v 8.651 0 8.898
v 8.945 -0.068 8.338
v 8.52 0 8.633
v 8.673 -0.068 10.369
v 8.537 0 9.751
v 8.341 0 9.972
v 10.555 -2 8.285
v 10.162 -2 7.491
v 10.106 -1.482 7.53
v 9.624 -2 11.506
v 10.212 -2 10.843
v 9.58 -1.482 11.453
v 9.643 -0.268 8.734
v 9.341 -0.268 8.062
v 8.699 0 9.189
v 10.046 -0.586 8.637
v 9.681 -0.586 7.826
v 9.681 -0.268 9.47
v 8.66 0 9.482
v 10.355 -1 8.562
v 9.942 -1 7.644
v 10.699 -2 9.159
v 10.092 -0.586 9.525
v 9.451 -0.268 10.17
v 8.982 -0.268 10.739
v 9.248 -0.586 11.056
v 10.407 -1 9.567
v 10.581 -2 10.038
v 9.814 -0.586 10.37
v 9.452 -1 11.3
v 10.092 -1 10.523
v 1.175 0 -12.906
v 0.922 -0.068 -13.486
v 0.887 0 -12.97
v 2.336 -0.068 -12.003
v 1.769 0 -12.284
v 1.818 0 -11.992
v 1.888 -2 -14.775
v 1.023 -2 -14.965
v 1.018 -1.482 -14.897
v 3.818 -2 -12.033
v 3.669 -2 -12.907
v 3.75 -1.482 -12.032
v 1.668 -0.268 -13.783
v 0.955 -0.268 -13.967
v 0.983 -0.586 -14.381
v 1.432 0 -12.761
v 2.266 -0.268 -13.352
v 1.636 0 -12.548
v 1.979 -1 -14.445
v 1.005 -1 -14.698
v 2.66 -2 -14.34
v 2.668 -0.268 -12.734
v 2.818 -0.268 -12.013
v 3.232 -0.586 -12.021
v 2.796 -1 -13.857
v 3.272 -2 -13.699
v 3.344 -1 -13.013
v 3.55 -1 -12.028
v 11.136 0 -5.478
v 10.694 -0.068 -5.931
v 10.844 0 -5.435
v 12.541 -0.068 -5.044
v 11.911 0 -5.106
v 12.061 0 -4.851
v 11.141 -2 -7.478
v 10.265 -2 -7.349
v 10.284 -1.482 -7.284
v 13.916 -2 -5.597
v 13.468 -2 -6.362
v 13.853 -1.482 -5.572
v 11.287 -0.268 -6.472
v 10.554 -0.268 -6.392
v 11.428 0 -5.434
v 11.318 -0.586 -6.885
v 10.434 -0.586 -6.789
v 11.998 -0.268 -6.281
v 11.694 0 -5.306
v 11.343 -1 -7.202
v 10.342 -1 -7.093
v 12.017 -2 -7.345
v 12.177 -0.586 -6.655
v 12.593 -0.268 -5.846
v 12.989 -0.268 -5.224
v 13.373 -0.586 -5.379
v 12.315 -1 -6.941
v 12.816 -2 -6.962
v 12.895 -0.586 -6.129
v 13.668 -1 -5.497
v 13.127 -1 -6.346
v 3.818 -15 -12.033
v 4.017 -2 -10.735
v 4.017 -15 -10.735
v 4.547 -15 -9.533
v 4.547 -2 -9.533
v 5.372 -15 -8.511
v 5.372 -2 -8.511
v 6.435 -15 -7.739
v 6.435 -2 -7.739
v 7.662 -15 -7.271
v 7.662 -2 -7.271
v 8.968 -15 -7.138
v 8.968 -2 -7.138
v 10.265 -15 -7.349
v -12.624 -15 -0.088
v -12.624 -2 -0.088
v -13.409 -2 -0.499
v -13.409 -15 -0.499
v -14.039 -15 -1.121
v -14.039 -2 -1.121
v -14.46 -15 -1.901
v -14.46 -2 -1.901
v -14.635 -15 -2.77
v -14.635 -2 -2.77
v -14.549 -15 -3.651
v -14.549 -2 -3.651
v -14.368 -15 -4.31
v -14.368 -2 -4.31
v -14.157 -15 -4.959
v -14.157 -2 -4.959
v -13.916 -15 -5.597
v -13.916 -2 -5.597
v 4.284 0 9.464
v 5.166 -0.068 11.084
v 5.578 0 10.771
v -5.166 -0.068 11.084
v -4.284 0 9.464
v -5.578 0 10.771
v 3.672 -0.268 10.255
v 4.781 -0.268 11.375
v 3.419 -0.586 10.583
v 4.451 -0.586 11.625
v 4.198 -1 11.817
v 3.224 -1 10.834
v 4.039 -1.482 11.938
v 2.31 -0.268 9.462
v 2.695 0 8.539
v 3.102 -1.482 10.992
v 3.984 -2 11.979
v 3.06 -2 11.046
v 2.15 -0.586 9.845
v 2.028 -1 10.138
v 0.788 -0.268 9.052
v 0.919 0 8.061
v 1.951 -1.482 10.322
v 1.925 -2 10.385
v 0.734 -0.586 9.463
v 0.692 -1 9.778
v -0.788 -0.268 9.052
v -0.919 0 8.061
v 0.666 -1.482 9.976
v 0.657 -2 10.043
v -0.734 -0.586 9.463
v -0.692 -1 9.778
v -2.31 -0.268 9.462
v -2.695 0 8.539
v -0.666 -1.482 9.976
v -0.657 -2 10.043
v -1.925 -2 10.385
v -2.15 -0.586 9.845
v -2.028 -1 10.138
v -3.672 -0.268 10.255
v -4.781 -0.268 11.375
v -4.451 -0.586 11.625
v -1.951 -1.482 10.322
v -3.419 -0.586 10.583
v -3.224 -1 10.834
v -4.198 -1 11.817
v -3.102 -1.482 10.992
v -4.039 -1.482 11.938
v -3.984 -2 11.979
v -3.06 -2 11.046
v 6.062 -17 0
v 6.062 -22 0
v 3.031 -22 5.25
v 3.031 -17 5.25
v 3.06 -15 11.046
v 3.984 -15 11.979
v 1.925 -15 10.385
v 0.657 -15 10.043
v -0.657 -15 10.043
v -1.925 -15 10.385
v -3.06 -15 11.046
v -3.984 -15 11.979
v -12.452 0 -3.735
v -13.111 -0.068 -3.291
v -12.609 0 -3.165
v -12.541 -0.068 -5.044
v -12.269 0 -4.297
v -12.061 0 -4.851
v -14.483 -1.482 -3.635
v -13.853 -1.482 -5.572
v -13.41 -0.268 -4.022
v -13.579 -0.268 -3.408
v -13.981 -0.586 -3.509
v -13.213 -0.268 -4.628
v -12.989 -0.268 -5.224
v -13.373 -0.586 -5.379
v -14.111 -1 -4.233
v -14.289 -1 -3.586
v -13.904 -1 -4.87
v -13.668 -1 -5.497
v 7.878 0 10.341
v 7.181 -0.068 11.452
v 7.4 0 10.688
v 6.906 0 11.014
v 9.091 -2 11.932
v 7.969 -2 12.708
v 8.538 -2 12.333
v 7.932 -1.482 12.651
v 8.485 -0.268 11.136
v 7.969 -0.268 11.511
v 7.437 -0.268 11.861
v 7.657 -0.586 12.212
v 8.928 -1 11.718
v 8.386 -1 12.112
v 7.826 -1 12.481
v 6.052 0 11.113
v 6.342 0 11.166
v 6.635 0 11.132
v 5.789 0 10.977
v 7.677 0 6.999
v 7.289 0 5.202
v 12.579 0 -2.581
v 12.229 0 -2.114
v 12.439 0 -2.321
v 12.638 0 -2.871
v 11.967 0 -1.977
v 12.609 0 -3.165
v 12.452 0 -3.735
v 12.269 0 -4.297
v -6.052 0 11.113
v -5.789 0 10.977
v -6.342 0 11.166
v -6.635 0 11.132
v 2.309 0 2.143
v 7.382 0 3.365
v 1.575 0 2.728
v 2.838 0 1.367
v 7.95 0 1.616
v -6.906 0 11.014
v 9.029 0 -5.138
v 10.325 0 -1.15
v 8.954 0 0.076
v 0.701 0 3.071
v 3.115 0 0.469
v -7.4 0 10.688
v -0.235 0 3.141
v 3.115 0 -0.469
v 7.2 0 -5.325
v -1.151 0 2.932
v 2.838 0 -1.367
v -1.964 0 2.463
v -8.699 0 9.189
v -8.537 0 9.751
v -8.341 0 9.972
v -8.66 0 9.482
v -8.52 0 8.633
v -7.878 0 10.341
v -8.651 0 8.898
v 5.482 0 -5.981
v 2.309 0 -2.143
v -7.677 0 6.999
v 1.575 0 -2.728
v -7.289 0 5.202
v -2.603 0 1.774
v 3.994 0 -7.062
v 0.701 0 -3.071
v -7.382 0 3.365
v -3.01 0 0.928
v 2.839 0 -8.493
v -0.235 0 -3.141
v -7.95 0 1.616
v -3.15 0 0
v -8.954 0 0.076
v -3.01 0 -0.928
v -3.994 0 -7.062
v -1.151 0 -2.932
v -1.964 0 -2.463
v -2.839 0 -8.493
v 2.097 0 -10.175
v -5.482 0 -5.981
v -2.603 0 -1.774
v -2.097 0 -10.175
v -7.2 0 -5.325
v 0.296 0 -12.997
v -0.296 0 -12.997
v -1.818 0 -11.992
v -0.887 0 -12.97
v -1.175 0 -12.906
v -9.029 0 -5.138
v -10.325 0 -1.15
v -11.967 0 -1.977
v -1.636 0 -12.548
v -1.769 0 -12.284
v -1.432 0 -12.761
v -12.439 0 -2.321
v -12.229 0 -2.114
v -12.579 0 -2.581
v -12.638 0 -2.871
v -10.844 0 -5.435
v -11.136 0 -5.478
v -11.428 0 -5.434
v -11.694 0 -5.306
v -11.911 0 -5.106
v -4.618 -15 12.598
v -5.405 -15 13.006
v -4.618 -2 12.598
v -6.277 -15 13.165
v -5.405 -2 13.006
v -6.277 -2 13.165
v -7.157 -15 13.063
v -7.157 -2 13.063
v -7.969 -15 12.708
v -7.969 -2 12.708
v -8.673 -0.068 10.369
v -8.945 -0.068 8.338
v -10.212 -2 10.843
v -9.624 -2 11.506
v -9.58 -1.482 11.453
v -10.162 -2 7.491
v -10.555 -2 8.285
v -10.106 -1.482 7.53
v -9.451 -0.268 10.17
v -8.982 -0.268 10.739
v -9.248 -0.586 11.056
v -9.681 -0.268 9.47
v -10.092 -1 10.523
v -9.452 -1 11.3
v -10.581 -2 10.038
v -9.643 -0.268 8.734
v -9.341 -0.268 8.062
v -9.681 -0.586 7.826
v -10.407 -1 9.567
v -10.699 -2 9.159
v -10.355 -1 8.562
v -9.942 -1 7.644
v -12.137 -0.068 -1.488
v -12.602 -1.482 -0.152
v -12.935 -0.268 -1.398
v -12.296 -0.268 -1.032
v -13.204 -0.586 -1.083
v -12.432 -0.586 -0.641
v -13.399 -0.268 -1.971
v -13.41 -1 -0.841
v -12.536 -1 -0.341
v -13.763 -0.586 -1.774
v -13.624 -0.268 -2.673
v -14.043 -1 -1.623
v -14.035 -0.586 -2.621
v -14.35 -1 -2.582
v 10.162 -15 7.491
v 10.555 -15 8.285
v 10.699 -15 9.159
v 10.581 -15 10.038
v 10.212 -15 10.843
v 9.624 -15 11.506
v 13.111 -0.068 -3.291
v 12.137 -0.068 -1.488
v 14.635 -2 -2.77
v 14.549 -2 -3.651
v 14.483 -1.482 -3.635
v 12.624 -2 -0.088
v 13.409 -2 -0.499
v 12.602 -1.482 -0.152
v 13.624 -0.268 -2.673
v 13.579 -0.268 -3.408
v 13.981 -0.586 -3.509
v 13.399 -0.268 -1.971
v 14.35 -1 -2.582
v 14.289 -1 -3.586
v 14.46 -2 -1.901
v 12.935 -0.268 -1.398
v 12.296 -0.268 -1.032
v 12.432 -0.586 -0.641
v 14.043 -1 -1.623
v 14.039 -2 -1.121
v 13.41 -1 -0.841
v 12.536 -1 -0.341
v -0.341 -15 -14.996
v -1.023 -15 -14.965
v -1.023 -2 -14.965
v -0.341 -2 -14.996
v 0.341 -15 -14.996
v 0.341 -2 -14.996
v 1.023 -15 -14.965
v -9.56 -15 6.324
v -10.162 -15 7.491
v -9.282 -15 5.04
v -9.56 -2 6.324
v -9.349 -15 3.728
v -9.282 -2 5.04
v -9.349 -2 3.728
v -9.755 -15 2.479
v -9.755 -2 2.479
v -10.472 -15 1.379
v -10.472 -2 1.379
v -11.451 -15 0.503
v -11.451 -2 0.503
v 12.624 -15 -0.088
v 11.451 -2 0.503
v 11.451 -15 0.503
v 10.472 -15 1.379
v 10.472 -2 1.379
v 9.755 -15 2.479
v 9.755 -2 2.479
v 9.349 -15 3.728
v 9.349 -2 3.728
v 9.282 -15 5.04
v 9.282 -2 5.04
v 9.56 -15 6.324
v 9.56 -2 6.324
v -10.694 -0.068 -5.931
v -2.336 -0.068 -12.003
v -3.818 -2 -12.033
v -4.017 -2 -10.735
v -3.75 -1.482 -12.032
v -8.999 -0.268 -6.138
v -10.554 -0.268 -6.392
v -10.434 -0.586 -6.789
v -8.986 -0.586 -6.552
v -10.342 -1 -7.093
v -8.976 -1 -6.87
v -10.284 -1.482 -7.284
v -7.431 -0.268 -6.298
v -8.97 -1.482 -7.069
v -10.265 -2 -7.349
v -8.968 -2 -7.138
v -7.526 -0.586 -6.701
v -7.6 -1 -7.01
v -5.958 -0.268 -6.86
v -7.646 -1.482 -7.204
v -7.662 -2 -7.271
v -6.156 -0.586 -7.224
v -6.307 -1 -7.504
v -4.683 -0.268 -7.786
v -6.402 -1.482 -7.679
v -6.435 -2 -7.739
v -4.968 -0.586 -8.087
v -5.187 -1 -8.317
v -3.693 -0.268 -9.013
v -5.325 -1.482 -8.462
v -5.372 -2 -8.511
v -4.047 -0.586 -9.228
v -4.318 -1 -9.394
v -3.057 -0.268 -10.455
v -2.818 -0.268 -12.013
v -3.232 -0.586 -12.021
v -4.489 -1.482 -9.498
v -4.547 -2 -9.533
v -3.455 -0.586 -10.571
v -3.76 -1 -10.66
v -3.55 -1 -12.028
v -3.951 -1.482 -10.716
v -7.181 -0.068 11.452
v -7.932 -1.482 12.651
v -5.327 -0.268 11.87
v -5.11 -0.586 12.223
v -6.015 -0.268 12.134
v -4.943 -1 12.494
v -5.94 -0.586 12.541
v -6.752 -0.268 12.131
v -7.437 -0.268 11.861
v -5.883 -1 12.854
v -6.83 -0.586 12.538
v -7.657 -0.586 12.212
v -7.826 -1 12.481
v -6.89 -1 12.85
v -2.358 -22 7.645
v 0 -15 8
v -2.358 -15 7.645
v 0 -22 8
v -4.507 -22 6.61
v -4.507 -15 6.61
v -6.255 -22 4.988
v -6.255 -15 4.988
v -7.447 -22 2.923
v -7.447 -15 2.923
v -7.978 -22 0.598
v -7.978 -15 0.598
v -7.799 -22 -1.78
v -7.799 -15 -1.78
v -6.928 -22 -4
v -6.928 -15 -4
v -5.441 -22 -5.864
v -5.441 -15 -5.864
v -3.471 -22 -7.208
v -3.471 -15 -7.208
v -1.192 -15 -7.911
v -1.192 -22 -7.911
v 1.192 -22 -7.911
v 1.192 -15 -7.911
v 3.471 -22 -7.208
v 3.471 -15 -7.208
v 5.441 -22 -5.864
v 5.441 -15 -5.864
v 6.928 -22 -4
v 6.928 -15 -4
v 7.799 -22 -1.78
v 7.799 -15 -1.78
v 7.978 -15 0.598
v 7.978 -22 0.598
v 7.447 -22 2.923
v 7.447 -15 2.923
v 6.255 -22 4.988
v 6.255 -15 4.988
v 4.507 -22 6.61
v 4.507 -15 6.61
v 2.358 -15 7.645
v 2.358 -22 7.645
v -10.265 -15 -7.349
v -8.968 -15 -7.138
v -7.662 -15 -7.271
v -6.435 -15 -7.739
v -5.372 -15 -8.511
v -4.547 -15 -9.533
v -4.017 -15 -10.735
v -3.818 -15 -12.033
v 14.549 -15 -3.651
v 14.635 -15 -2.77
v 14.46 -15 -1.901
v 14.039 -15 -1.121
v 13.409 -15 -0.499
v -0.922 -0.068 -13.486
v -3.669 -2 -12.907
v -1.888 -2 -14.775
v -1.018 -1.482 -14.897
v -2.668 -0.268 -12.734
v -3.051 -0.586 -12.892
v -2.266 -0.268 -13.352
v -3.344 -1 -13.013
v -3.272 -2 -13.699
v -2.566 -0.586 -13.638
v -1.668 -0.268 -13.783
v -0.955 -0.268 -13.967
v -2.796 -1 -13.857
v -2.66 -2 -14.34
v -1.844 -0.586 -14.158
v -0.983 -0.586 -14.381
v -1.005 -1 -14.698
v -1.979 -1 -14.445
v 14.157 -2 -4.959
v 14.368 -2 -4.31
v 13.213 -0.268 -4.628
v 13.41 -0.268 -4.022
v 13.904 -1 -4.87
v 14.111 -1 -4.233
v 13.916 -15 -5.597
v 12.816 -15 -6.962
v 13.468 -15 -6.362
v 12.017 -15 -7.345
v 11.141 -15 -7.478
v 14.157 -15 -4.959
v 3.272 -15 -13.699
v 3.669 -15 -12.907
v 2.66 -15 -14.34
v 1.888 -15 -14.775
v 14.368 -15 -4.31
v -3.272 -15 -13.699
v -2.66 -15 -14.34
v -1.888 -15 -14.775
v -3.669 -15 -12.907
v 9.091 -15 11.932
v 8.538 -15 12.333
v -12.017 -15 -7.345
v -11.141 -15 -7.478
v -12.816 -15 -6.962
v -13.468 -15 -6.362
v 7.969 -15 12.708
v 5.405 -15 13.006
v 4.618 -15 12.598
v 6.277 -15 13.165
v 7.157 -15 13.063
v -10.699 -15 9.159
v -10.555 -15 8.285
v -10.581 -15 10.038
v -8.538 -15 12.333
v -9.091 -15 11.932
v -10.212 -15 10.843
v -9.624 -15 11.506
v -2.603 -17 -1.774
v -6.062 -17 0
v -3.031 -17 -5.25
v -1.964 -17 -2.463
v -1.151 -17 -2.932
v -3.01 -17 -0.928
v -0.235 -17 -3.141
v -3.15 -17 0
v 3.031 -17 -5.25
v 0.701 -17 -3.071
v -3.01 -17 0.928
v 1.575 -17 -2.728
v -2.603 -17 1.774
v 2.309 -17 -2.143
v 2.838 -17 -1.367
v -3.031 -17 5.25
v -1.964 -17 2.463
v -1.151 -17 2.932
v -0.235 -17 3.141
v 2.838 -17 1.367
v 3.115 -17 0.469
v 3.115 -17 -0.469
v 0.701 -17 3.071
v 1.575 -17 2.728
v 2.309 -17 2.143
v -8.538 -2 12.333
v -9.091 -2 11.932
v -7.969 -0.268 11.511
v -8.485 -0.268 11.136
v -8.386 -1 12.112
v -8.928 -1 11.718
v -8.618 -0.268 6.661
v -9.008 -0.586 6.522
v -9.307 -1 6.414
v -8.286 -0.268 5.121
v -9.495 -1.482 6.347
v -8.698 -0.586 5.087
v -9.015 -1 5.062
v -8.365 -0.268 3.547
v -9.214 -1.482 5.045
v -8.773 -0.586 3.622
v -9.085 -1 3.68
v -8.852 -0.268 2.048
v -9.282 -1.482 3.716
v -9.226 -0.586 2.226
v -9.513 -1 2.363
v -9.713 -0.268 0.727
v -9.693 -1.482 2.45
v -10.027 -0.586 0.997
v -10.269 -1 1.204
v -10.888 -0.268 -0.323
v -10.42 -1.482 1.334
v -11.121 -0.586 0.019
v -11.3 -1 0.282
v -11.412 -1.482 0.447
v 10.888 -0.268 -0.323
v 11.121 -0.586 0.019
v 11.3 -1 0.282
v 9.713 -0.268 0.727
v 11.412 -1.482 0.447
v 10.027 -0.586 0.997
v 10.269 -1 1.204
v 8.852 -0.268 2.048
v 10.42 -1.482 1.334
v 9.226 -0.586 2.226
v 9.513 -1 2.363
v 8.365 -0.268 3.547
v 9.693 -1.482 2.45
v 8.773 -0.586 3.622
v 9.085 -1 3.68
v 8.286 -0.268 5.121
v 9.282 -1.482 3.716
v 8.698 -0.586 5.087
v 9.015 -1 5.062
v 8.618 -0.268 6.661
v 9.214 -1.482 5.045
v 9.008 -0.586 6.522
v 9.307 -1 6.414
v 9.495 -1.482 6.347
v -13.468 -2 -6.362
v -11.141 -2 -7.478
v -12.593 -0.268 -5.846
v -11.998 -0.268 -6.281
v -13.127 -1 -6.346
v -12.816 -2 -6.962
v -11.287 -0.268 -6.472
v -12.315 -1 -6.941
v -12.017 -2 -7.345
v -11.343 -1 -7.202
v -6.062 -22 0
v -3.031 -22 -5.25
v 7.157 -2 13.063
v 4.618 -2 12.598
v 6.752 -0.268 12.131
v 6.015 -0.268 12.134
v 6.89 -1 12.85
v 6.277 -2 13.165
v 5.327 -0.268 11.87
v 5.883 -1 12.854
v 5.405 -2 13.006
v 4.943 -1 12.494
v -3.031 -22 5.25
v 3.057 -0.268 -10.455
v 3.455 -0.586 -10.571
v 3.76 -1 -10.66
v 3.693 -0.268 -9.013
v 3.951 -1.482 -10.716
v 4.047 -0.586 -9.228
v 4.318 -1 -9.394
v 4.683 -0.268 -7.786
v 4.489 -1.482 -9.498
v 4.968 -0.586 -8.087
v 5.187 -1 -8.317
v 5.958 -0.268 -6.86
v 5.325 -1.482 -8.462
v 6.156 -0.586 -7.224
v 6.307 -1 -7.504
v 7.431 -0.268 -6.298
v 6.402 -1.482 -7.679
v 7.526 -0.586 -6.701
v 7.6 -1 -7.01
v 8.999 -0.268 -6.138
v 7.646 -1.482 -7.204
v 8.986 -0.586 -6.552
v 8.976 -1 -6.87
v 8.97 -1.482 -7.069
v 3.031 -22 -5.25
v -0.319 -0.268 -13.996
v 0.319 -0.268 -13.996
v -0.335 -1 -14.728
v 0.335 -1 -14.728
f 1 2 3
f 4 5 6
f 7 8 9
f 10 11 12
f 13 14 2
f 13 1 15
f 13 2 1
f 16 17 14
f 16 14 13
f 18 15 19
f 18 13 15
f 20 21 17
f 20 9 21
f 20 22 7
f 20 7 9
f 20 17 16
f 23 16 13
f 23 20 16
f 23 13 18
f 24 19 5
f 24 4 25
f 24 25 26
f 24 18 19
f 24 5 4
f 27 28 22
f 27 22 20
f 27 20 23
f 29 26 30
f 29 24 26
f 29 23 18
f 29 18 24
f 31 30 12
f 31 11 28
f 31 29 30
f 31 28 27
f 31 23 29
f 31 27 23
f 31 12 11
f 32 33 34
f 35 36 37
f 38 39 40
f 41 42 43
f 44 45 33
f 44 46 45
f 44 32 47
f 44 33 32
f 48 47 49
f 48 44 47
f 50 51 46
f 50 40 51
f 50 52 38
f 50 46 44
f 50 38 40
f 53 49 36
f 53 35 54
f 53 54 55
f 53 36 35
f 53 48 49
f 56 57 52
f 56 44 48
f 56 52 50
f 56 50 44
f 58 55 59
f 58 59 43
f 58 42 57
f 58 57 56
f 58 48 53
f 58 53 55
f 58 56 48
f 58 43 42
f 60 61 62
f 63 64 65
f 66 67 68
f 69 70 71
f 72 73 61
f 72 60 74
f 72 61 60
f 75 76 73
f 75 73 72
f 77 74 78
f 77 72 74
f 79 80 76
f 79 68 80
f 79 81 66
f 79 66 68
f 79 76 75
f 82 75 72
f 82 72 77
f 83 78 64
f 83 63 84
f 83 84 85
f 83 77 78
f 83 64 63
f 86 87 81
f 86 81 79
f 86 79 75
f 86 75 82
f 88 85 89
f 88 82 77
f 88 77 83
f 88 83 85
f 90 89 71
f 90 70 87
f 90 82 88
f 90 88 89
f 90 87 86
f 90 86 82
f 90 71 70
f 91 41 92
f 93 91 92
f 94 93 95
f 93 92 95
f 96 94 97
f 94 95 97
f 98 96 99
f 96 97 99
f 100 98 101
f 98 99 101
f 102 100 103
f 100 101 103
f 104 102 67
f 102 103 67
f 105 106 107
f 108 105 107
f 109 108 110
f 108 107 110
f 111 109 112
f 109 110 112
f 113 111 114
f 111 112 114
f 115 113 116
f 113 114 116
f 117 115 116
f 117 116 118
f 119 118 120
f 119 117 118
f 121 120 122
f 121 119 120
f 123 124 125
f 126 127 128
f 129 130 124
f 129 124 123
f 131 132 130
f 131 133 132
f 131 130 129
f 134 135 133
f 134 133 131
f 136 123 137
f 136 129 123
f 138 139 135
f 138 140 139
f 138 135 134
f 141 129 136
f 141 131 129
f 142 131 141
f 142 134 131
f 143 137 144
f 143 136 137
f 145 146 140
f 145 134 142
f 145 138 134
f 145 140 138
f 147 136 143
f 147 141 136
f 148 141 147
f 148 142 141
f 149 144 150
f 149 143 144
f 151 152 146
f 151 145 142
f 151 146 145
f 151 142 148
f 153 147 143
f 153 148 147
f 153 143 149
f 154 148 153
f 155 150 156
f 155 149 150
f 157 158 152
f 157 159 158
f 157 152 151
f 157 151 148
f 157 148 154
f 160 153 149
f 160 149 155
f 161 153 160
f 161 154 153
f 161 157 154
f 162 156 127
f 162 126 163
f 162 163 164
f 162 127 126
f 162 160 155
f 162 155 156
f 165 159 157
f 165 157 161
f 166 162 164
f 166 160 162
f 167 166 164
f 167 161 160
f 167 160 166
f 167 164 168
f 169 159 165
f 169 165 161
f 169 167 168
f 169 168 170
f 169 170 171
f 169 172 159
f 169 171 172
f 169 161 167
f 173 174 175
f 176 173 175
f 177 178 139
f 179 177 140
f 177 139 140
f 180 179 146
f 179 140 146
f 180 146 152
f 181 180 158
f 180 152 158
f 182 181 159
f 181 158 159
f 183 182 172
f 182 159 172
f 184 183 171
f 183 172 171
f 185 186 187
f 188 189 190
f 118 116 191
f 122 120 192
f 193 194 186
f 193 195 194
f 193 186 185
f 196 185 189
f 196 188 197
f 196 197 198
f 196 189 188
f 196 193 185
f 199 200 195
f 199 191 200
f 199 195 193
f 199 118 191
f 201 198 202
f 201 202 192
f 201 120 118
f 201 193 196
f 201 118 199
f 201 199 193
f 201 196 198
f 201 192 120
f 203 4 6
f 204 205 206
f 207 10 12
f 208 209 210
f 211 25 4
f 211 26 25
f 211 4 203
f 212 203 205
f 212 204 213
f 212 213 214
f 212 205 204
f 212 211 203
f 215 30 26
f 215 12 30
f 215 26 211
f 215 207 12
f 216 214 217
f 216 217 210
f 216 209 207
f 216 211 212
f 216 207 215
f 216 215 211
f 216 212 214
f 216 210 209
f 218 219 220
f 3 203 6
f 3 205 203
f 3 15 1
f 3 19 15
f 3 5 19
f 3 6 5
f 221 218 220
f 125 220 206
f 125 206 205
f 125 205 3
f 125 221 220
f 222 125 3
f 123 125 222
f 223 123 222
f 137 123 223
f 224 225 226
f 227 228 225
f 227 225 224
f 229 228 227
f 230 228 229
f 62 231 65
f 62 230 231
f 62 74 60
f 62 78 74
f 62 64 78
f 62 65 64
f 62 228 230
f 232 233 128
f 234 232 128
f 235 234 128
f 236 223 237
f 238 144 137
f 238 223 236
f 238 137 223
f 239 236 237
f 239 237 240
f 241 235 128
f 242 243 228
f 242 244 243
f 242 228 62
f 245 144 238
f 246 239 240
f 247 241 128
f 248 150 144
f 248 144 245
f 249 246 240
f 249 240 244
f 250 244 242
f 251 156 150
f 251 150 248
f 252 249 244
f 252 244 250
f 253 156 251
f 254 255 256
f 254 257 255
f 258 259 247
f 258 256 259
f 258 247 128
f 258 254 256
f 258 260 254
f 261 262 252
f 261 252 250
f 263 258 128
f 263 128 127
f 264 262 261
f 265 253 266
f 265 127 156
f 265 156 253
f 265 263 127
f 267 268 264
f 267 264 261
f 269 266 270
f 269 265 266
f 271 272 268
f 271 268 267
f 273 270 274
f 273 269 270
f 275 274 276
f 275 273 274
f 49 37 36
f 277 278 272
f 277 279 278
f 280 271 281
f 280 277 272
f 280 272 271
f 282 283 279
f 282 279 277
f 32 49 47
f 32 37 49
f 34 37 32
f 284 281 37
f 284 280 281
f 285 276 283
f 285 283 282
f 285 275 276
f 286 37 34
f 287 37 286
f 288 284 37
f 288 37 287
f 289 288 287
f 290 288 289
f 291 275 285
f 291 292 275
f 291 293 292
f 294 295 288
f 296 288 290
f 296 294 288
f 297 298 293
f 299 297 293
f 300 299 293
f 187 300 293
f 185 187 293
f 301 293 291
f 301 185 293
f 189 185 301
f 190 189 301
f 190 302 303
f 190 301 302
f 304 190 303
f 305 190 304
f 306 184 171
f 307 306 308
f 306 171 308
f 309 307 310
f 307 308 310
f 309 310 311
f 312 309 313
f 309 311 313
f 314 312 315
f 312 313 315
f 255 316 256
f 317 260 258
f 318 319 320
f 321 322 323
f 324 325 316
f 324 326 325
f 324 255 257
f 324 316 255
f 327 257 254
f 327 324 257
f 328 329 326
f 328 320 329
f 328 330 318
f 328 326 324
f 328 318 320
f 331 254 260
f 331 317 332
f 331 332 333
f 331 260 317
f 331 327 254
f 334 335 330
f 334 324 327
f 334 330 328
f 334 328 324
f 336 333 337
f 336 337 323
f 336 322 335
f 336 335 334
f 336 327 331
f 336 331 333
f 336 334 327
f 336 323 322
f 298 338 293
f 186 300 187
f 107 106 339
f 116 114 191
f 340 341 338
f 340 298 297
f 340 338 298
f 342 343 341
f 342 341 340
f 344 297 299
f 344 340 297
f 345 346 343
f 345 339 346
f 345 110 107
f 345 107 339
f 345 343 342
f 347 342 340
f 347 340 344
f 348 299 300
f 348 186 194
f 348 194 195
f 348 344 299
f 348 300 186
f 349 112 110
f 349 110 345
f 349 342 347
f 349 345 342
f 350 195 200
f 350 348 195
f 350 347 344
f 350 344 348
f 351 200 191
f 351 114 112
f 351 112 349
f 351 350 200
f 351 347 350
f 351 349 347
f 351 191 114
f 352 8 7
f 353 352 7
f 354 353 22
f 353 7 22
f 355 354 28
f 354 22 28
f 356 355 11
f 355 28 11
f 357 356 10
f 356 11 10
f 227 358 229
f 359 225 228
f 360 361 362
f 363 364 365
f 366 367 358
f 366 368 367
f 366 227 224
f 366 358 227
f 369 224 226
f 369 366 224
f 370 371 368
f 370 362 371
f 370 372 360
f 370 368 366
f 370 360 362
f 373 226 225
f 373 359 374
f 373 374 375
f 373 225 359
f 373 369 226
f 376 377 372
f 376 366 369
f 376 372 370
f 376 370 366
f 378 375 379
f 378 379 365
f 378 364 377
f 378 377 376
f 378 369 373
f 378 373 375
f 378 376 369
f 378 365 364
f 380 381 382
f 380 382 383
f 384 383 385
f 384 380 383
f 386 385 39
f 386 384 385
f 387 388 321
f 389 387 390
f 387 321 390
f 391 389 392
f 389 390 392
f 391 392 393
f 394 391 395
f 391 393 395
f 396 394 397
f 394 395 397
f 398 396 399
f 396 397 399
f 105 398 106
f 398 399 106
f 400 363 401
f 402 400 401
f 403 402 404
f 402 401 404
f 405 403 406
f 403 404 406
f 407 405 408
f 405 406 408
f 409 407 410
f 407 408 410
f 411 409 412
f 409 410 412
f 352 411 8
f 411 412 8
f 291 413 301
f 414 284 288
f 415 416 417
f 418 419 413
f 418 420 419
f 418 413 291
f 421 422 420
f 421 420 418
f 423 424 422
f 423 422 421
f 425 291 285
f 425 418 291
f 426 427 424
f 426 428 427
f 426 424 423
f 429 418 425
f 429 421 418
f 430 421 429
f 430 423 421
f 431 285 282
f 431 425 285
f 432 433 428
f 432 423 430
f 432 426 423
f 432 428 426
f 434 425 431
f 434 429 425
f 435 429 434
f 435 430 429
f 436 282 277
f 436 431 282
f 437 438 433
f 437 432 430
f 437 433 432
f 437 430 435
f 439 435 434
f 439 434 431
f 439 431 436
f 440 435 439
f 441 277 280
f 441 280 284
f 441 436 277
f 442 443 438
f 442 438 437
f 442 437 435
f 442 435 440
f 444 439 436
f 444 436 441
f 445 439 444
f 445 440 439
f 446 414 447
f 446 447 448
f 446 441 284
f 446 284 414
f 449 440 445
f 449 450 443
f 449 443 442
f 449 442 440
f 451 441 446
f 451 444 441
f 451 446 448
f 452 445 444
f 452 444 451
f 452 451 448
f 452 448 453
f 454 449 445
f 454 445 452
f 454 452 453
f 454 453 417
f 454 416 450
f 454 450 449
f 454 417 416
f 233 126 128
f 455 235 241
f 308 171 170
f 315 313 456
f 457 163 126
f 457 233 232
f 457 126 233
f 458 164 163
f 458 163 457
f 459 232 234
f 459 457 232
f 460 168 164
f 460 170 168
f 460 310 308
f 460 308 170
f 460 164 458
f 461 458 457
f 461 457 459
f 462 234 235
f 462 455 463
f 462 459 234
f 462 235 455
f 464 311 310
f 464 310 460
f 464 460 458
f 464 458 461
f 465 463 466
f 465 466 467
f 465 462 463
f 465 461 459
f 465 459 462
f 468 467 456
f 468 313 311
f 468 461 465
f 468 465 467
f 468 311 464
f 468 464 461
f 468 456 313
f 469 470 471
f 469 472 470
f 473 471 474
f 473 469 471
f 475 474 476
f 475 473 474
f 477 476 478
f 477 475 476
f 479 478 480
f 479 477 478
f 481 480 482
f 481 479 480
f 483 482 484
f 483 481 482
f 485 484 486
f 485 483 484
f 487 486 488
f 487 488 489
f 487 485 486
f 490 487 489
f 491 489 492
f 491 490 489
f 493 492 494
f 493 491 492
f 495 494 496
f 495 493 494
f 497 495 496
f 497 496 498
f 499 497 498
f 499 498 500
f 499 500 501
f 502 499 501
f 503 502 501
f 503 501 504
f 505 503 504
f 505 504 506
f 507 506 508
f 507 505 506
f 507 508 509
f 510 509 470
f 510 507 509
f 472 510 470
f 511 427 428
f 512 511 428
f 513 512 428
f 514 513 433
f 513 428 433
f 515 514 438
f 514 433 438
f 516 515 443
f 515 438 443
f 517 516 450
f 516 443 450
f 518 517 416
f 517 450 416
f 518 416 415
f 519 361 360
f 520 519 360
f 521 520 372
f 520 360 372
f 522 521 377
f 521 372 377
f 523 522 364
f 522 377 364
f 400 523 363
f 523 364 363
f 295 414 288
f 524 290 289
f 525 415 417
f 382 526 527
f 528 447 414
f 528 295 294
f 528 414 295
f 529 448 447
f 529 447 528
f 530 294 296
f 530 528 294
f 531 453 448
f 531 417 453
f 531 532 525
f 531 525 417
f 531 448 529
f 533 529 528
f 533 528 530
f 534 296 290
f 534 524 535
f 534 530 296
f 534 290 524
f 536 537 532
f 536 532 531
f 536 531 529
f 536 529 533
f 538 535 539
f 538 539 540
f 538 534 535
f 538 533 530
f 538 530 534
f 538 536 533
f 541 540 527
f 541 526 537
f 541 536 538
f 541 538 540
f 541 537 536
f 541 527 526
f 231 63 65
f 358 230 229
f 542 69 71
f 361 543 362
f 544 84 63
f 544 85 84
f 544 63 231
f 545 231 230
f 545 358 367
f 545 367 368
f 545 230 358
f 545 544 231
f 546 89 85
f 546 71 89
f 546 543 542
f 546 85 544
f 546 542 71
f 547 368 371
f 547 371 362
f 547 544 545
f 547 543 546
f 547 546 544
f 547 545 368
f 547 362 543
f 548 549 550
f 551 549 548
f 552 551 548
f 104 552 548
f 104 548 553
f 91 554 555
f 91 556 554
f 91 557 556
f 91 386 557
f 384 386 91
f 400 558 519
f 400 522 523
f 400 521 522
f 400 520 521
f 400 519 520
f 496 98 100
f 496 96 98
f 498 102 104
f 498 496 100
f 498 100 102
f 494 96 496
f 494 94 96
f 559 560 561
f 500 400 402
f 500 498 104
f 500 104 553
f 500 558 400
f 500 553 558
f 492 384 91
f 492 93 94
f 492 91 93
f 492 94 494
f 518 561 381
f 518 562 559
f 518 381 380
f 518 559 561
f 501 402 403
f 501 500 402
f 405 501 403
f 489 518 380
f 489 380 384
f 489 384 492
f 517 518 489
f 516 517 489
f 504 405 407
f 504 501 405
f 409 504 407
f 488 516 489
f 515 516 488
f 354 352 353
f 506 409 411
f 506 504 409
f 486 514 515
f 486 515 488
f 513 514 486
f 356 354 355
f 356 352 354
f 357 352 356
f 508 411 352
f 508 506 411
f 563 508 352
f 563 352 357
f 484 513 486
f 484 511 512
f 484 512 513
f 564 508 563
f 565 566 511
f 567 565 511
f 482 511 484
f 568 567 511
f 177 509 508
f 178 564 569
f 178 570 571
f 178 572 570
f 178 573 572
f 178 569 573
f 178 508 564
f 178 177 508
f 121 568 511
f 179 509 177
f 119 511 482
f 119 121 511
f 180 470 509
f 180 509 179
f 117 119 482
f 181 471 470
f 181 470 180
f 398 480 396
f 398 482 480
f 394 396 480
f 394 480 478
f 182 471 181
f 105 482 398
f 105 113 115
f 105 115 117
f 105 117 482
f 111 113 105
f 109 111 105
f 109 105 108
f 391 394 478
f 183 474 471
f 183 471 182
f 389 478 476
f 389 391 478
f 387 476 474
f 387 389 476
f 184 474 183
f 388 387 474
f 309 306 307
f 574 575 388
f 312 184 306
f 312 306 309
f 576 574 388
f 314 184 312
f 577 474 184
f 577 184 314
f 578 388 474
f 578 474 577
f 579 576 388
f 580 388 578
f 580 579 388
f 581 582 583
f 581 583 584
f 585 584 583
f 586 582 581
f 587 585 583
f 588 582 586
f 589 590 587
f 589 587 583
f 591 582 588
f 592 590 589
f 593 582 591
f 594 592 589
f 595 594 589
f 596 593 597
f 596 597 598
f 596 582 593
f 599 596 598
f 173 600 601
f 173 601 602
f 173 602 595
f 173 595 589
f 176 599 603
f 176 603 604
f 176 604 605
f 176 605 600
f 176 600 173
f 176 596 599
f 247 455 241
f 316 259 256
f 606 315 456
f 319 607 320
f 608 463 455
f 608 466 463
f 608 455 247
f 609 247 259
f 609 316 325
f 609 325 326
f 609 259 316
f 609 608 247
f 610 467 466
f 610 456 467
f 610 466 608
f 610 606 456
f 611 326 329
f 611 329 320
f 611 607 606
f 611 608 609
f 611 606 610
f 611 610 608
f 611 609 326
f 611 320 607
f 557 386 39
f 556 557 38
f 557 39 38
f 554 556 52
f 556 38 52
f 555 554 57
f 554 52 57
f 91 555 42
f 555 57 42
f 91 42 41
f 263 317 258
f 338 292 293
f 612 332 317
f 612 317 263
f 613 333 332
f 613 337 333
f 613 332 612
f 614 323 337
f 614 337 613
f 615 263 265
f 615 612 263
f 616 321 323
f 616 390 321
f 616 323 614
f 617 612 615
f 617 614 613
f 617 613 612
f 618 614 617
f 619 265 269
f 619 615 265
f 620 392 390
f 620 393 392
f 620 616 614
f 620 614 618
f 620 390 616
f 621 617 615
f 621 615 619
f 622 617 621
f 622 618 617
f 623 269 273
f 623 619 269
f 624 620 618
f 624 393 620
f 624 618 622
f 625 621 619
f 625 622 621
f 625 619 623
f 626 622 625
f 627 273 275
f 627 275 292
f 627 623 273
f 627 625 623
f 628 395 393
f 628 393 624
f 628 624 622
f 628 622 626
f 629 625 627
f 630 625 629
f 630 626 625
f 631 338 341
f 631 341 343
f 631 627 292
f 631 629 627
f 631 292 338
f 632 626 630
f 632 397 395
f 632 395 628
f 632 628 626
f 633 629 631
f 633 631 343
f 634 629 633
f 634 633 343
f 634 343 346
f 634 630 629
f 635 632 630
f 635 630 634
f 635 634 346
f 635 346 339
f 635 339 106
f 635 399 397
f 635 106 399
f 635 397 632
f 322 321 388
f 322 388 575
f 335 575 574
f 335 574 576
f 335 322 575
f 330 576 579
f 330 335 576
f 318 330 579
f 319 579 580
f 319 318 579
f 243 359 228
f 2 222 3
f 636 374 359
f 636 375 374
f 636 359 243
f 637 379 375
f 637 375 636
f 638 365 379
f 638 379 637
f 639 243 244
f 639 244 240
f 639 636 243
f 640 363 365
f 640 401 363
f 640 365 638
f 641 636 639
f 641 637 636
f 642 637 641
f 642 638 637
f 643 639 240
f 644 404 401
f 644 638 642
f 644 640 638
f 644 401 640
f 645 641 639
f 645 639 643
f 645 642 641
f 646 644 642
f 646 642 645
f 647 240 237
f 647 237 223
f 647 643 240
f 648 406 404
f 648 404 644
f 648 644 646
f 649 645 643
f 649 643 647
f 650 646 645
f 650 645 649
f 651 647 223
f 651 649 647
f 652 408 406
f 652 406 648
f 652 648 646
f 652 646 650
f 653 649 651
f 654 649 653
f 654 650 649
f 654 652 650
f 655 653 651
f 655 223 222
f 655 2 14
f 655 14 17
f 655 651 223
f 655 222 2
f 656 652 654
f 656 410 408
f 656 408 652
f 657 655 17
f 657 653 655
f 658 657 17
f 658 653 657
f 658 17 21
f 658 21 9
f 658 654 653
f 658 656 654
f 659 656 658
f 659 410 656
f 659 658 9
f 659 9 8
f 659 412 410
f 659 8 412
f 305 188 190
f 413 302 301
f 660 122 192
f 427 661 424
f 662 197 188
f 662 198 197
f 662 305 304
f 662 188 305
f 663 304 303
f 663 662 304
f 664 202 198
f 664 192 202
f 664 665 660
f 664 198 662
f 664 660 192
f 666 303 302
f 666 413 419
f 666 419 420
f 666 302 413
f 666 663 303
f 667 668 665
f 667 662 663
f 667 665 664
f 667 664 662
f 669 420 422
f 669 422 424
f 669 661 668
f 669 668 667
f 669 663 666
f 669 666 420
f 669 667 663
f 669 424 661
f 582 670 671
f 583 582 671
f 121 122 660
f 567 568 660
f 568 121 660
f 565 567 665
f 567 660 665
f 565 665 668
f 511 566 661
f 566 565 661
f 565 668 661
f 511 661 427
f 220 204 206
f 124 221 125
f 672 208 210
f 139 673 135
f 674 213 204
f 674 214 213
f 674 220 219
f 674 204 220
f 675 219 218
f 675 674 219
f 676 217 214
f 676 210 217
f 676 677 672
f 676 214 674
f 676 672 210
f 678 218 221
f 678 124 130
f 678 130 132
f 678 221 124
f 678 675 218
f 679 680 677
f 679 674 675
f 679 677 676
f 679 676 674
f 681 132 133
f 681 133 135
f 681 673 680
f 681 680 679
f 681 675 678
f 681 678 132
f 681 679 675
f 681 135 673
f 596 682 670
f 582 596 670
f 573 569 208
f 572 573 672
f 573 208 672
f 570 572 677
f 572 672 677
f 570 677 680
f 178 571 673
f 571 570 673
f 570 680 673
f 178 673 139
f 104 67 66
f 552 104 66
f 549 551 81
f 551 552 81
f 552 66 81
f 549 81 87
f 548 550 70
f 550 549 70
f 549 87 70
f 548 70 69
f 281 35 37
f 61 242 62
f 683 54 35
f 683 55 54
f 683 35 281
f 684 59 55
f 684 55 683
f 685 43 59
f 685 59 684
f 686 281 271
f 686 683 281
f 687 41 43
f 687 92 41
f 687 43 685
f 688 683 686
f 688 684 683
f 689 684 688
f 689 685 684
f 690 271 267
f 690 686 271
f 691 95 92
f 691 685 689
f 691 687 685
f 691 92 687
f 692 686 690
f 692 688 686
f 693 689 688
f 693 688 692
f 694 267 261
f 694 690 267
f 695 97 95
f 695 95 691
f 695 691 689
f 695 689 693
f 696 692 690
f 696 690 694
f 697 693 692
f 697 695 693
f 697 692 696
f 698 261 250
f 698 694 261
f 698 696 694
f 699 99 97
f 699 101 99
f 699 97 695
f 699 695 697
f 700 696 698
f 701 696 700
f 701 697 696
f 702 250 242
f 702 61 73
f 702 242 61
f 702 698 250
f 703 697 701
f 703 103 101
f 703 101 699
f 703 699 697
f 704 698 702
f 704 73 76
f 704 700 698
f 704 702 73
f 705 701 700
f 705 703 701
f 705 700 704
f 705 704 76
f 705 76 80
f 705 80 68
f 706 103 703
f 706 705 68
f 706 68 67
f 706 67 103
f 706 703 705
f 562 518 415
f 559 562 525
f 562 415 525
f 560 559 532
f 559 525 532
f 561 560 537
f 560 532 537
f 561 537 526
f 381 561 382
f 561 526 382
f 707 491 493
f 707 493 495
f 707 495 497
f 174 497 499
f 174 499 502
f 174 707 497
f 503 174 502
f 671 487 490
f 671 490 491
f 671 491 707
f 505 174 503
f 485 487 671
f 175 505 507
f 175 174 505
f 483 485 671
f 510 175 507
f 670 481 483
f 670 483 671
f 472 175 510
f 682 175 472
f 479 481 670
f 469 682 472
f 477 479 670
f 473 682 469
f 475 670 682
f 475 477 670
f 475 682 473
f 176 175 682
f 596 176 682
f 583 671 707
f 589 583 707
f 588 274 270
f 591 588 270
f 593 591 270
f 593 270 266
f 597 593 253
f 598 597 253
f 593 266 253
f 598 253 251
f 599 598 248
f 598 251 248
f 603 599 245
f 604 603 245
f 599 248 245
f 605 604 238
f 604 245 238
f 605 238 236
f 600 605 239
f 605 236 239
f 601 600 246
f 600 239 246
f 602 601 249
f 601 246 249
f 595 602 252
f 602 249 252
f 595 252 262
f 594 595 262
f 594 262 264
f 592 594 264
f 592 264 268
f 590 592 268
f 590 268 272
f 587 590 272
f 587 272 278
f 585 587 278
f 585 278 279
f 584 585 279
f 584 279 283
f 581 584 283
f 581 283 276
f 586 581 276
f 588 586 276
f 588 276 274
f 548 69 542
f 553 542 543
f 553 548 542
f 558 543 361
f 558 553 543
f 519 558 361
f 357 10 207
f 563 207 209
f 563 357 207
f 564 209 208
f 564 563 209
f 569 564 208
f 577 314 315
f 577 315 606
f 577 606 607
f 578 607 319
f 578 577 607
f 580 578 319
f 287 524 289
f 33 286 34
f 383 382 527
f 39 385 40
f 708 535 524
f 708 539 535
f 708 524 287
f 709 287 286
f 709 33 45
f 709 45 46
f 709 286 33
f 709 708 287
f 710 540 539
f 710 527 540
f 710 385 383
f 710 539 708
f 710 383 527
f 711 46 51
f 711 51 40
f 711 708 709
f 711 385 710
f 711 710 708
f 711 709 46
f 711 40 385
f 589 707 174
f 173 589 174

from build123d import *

# Parameters (mm, degrees)
F2_R        = 5
F3_DEPTH    = 15
F4_T1_DEPTH = 31.851779741
F6_DEPTH    = 5
F7_D        = 6.3
F8_R        = 2


# Not quite as in the source:
# - a fillet or chamfer that OpenCascade refuses, or shapes differently, is made with other operations: its cross-section is extruded or revolved along the edge and cut away or added


with BuildPart() as f1:
    # F0 (on Right) → F1 (revolve)
    with BuildSketch(Plane.YZ):
        Polygon((-22, 0), (0, 0), (0, 15), (-15, 15), (-15, 8), (-22, 8), align=None)
    revolve(axis=Axis((0, -11, 0), (0, -1, 0)))

    # F2 (on face) → F3 (cut)
    with BuildSketch(Plane(origin=(0, 0, 0), x_dir=(-1, 0, 0), z_dir=(0, 1, 0))):
        with Locations((0, 15)):
            Circle(F2_R)
        with Locations((-14.2658477444, 4.6352549156)):
            Circle(F2_R)
        with Locations((-8.8167787844, -12.1352549156)):
            Circle(F2_R)
        with Locations((8.8167787844, -12.1352549156)):
            Circle(F2_R)
        with Locations((14.2658477444, 4.6352549156)):
            Circle(F2_R)
    extrude(amount=-F3_DEPTH, mode=Mode.SUBTRACT)

    # F4: fillet of radius 3 on 10 edges, made by hand

    # F4_s2 → F4_t1 (cut)
    with BuildSketch(Plane.XZ.offset(-8.4258898705)):
        with BuildLine():
            ThreePointArc((14.5487698044, -3.6514787659), (14.2786844682, -1.4956481826), (12.6240778064, -0.0875187896))
            ThreePointArc((12.6240778064, -0.0875187896), (13.7969148622, -0.3427067106), (14.9967749751, -0.3110311036))
            ThreePointArc((14.9967749751, -0.3110311036), (14.8668911251, -1.993877698), (14.5487698044, -3.6514787659))
        make_face()
        with BuildLine():
            ThreePointArc((10.1616512299, 7.4910509465), (10.6725784478, 9.6028049498), (9.6239166514, 11.5056607062))
            ThreePointArc((9.6239166514, 11.5056607062), (10.855595668, 10.3516202931), (11.94982632, 9.0665126108))
            ThreePointArc((11.94982632, 9.0665126108), (10.9605006431, 8.3868786361), (10.1616512299, 7.4910509465))
        make_face()
        with BuildLine():
            ThreePointArc((1.0230544424, -14.9650713198), (2.9899102079, -14.0420166136), (3.8178192654, -12.0332562533))
            ThreePointArc((3.8178192654, -12.0332562533), (3.9375477121, -13.2275479821), (4.3384501703, -14.3588944602))
            ThreePointArc((4.3384501703, -14.3588944602), (2.6978316338, -14.755395775), (1.0230544424, -14.9650713198))
        make_face()
        with BuildLine():
            ThreePointArc((10.2645357375, -7.3494425703), (12.4308183364, -7.1827953553), (13.9164873867, -5.5974439539))
            ThreePointArc((13.9164873867, -5.5974439539), (13.1995394795, -7.1254584084), (12.3154653113, -8.5632537137))
            ThreePointArc((12.3154653113, -8.5632537137), (11.3633765438, -7.8323675302), (10.2645357375, -7.3494425703))
        make_face()
        with BuildLine():
            ThreePointArc((-13.9164873867, -5.5974439539), (-12.4308183364, -7.1827953553), (-10.2645357375, -7.3494425703))
            ThreePointArc((-10.2645357375, -7.3494425703), (-11.3633765438, -7.8323675302), (-12.3154653113, -8.5632537137))
            ThreePointArc((-12.3154653113, -8.5632537137), (-13.1995394795, -7.1254584084), (-13.9164873867, -5.5974439539))
        make_face()
        with BuildLine():
            ThreePointArc((-3.8178192654, -12.0332562533), (-2.9899102079, -14.0420166136), (-1.0230544424, -14.9650713198))
            ThreePointArc((-1.0230544424, -14.9650713198), (-2.6978316338, -14.755395775), (-4.3384501703, -14.3588944602))
            ThreePointArc((-4.3384501703, -14.3588944602), (-3.9375477121, -13.2275479821), (-3.8178192654, -12.0332562533))
        make_face()
        with BuildLine():
            ThreePointArc((-12.6240778064, -0.0875187896), (-14.2786844682, -1.4956481826), (-14.5487698044, -3.6514787659))
            ThreePointArc((-14.5487698044, -3.6514787659), (-14.8668911251, -1.993877698), (-14.9967749751, -0.3110311036))
            ThreePointArc((-14.9967749751, -0.3110311036), (-13.7969148622, -0.3427067106), (-12.6240778064, -0.0875187896))
        make_face()
        with BuildLine():
            ThreePointArc((-10.1616512299, 7.4910509465), (-10.6725784478, 9.6028049498), (-9.6239166514, 11.5056607062))
            ThreePointArc((-9.6239166514, 11.5056607062), (-10.855595668, 10.3516202931), (-11.94982632, 9.0665126108))
            ThreePointArc((-11.94982632, 9.0665126108), (-10.9605006431, 8.3868786361), (-10.1616512299, 7.4910509465))
        make_face()
        with BuildLine():
            ThreePointArc((7.9685797912, 12.7083333333), (5.8348021081, 13.1176552016), (3.9842898956, 11.9791666667))
            ThreePointArc((3.9842898956, 11.9791666667), (4.5894146126, 13.0157435868), (4.9300664859, 14.1666666667))
            ThreePointArc((4.9300664859, 14.1666666667), (6.4904123885, 13.5231115882), (7.9685797912, 12.7083333333))
        make_face()
        with BuildLine():
            ThreePointArc((-3.9842898956, 11.9791666667), (-5.8348021081, 13.1176552016), (-7.9685797912, 12.7083333333))
            ThreePointArc((-7.9685797912, 12.7083333333), (-6.4904123885, 13.5231115882), (-4.9300664859, 14.1666666667))
            ThreePointArc((-4.9300664859, 14.1666666667), (-4.5894146126, 13.0157435868), (-3.9842898956, 11.9791666667))
        make_face()
    extrude(amount=F4_T1_DEPTH, mode=Mode.SUBTRACT)

    # F5 (on face) → F6 (cut)
    with BuildSketch(Plane.XZ.offset(22)):
        Polygon((3.0310889132, 5.25), (-3.0310889132, 5.25), (-6.0621778265, 0), (-3.0310889132, -5.25), (3.0310889132, -5.25), (6.0621778265, 0), align=None)
    extrude(amount=-F6_DEPTH, mode=Mode.SUBTRACT)

    # F7 (through all)
    with Locations(Plane.XZ.offset(22)):
        with Locations((0, 0)):
            Hole(F7_D / 2)

    # F8
    f8_edges = [f1.edges().sort_by_distance(p)[0] for p in [
        (-8.816779, 0, 12.135255),
        (-5.834802, 0, 13.117655),
        (-10.672578, 0, 9.602805),
        (0, 0, 10),
        (-9.510565, 0, 3.09017),
        (5.834802, 0, 13.117655),
        (-14.278684, 0, -1.495648),
        (8.816779, 0, 12.135255),
        (-14.265848, 0, -4.635255),
        (10.672578, 0, 9.602805),
        (-12.430818, 0, -7.182795),
        (9.510565, 0, 3.09017),
        (-5.877853, 0, -8.09017),
        (14.278684, 0, -1.495648),
        (-2.98991, 0, -14.042017),
        (14.265848, 0, -4.635255),
        (0, 0, -15),
        (12.430818, 0, -7.182795),
        (2.98991, 0, -14.042017),
        (5.877853, 0, -8.09017),
    ]]
    fillet(f8_edges, radius=F8_R)


solid = f1.part
